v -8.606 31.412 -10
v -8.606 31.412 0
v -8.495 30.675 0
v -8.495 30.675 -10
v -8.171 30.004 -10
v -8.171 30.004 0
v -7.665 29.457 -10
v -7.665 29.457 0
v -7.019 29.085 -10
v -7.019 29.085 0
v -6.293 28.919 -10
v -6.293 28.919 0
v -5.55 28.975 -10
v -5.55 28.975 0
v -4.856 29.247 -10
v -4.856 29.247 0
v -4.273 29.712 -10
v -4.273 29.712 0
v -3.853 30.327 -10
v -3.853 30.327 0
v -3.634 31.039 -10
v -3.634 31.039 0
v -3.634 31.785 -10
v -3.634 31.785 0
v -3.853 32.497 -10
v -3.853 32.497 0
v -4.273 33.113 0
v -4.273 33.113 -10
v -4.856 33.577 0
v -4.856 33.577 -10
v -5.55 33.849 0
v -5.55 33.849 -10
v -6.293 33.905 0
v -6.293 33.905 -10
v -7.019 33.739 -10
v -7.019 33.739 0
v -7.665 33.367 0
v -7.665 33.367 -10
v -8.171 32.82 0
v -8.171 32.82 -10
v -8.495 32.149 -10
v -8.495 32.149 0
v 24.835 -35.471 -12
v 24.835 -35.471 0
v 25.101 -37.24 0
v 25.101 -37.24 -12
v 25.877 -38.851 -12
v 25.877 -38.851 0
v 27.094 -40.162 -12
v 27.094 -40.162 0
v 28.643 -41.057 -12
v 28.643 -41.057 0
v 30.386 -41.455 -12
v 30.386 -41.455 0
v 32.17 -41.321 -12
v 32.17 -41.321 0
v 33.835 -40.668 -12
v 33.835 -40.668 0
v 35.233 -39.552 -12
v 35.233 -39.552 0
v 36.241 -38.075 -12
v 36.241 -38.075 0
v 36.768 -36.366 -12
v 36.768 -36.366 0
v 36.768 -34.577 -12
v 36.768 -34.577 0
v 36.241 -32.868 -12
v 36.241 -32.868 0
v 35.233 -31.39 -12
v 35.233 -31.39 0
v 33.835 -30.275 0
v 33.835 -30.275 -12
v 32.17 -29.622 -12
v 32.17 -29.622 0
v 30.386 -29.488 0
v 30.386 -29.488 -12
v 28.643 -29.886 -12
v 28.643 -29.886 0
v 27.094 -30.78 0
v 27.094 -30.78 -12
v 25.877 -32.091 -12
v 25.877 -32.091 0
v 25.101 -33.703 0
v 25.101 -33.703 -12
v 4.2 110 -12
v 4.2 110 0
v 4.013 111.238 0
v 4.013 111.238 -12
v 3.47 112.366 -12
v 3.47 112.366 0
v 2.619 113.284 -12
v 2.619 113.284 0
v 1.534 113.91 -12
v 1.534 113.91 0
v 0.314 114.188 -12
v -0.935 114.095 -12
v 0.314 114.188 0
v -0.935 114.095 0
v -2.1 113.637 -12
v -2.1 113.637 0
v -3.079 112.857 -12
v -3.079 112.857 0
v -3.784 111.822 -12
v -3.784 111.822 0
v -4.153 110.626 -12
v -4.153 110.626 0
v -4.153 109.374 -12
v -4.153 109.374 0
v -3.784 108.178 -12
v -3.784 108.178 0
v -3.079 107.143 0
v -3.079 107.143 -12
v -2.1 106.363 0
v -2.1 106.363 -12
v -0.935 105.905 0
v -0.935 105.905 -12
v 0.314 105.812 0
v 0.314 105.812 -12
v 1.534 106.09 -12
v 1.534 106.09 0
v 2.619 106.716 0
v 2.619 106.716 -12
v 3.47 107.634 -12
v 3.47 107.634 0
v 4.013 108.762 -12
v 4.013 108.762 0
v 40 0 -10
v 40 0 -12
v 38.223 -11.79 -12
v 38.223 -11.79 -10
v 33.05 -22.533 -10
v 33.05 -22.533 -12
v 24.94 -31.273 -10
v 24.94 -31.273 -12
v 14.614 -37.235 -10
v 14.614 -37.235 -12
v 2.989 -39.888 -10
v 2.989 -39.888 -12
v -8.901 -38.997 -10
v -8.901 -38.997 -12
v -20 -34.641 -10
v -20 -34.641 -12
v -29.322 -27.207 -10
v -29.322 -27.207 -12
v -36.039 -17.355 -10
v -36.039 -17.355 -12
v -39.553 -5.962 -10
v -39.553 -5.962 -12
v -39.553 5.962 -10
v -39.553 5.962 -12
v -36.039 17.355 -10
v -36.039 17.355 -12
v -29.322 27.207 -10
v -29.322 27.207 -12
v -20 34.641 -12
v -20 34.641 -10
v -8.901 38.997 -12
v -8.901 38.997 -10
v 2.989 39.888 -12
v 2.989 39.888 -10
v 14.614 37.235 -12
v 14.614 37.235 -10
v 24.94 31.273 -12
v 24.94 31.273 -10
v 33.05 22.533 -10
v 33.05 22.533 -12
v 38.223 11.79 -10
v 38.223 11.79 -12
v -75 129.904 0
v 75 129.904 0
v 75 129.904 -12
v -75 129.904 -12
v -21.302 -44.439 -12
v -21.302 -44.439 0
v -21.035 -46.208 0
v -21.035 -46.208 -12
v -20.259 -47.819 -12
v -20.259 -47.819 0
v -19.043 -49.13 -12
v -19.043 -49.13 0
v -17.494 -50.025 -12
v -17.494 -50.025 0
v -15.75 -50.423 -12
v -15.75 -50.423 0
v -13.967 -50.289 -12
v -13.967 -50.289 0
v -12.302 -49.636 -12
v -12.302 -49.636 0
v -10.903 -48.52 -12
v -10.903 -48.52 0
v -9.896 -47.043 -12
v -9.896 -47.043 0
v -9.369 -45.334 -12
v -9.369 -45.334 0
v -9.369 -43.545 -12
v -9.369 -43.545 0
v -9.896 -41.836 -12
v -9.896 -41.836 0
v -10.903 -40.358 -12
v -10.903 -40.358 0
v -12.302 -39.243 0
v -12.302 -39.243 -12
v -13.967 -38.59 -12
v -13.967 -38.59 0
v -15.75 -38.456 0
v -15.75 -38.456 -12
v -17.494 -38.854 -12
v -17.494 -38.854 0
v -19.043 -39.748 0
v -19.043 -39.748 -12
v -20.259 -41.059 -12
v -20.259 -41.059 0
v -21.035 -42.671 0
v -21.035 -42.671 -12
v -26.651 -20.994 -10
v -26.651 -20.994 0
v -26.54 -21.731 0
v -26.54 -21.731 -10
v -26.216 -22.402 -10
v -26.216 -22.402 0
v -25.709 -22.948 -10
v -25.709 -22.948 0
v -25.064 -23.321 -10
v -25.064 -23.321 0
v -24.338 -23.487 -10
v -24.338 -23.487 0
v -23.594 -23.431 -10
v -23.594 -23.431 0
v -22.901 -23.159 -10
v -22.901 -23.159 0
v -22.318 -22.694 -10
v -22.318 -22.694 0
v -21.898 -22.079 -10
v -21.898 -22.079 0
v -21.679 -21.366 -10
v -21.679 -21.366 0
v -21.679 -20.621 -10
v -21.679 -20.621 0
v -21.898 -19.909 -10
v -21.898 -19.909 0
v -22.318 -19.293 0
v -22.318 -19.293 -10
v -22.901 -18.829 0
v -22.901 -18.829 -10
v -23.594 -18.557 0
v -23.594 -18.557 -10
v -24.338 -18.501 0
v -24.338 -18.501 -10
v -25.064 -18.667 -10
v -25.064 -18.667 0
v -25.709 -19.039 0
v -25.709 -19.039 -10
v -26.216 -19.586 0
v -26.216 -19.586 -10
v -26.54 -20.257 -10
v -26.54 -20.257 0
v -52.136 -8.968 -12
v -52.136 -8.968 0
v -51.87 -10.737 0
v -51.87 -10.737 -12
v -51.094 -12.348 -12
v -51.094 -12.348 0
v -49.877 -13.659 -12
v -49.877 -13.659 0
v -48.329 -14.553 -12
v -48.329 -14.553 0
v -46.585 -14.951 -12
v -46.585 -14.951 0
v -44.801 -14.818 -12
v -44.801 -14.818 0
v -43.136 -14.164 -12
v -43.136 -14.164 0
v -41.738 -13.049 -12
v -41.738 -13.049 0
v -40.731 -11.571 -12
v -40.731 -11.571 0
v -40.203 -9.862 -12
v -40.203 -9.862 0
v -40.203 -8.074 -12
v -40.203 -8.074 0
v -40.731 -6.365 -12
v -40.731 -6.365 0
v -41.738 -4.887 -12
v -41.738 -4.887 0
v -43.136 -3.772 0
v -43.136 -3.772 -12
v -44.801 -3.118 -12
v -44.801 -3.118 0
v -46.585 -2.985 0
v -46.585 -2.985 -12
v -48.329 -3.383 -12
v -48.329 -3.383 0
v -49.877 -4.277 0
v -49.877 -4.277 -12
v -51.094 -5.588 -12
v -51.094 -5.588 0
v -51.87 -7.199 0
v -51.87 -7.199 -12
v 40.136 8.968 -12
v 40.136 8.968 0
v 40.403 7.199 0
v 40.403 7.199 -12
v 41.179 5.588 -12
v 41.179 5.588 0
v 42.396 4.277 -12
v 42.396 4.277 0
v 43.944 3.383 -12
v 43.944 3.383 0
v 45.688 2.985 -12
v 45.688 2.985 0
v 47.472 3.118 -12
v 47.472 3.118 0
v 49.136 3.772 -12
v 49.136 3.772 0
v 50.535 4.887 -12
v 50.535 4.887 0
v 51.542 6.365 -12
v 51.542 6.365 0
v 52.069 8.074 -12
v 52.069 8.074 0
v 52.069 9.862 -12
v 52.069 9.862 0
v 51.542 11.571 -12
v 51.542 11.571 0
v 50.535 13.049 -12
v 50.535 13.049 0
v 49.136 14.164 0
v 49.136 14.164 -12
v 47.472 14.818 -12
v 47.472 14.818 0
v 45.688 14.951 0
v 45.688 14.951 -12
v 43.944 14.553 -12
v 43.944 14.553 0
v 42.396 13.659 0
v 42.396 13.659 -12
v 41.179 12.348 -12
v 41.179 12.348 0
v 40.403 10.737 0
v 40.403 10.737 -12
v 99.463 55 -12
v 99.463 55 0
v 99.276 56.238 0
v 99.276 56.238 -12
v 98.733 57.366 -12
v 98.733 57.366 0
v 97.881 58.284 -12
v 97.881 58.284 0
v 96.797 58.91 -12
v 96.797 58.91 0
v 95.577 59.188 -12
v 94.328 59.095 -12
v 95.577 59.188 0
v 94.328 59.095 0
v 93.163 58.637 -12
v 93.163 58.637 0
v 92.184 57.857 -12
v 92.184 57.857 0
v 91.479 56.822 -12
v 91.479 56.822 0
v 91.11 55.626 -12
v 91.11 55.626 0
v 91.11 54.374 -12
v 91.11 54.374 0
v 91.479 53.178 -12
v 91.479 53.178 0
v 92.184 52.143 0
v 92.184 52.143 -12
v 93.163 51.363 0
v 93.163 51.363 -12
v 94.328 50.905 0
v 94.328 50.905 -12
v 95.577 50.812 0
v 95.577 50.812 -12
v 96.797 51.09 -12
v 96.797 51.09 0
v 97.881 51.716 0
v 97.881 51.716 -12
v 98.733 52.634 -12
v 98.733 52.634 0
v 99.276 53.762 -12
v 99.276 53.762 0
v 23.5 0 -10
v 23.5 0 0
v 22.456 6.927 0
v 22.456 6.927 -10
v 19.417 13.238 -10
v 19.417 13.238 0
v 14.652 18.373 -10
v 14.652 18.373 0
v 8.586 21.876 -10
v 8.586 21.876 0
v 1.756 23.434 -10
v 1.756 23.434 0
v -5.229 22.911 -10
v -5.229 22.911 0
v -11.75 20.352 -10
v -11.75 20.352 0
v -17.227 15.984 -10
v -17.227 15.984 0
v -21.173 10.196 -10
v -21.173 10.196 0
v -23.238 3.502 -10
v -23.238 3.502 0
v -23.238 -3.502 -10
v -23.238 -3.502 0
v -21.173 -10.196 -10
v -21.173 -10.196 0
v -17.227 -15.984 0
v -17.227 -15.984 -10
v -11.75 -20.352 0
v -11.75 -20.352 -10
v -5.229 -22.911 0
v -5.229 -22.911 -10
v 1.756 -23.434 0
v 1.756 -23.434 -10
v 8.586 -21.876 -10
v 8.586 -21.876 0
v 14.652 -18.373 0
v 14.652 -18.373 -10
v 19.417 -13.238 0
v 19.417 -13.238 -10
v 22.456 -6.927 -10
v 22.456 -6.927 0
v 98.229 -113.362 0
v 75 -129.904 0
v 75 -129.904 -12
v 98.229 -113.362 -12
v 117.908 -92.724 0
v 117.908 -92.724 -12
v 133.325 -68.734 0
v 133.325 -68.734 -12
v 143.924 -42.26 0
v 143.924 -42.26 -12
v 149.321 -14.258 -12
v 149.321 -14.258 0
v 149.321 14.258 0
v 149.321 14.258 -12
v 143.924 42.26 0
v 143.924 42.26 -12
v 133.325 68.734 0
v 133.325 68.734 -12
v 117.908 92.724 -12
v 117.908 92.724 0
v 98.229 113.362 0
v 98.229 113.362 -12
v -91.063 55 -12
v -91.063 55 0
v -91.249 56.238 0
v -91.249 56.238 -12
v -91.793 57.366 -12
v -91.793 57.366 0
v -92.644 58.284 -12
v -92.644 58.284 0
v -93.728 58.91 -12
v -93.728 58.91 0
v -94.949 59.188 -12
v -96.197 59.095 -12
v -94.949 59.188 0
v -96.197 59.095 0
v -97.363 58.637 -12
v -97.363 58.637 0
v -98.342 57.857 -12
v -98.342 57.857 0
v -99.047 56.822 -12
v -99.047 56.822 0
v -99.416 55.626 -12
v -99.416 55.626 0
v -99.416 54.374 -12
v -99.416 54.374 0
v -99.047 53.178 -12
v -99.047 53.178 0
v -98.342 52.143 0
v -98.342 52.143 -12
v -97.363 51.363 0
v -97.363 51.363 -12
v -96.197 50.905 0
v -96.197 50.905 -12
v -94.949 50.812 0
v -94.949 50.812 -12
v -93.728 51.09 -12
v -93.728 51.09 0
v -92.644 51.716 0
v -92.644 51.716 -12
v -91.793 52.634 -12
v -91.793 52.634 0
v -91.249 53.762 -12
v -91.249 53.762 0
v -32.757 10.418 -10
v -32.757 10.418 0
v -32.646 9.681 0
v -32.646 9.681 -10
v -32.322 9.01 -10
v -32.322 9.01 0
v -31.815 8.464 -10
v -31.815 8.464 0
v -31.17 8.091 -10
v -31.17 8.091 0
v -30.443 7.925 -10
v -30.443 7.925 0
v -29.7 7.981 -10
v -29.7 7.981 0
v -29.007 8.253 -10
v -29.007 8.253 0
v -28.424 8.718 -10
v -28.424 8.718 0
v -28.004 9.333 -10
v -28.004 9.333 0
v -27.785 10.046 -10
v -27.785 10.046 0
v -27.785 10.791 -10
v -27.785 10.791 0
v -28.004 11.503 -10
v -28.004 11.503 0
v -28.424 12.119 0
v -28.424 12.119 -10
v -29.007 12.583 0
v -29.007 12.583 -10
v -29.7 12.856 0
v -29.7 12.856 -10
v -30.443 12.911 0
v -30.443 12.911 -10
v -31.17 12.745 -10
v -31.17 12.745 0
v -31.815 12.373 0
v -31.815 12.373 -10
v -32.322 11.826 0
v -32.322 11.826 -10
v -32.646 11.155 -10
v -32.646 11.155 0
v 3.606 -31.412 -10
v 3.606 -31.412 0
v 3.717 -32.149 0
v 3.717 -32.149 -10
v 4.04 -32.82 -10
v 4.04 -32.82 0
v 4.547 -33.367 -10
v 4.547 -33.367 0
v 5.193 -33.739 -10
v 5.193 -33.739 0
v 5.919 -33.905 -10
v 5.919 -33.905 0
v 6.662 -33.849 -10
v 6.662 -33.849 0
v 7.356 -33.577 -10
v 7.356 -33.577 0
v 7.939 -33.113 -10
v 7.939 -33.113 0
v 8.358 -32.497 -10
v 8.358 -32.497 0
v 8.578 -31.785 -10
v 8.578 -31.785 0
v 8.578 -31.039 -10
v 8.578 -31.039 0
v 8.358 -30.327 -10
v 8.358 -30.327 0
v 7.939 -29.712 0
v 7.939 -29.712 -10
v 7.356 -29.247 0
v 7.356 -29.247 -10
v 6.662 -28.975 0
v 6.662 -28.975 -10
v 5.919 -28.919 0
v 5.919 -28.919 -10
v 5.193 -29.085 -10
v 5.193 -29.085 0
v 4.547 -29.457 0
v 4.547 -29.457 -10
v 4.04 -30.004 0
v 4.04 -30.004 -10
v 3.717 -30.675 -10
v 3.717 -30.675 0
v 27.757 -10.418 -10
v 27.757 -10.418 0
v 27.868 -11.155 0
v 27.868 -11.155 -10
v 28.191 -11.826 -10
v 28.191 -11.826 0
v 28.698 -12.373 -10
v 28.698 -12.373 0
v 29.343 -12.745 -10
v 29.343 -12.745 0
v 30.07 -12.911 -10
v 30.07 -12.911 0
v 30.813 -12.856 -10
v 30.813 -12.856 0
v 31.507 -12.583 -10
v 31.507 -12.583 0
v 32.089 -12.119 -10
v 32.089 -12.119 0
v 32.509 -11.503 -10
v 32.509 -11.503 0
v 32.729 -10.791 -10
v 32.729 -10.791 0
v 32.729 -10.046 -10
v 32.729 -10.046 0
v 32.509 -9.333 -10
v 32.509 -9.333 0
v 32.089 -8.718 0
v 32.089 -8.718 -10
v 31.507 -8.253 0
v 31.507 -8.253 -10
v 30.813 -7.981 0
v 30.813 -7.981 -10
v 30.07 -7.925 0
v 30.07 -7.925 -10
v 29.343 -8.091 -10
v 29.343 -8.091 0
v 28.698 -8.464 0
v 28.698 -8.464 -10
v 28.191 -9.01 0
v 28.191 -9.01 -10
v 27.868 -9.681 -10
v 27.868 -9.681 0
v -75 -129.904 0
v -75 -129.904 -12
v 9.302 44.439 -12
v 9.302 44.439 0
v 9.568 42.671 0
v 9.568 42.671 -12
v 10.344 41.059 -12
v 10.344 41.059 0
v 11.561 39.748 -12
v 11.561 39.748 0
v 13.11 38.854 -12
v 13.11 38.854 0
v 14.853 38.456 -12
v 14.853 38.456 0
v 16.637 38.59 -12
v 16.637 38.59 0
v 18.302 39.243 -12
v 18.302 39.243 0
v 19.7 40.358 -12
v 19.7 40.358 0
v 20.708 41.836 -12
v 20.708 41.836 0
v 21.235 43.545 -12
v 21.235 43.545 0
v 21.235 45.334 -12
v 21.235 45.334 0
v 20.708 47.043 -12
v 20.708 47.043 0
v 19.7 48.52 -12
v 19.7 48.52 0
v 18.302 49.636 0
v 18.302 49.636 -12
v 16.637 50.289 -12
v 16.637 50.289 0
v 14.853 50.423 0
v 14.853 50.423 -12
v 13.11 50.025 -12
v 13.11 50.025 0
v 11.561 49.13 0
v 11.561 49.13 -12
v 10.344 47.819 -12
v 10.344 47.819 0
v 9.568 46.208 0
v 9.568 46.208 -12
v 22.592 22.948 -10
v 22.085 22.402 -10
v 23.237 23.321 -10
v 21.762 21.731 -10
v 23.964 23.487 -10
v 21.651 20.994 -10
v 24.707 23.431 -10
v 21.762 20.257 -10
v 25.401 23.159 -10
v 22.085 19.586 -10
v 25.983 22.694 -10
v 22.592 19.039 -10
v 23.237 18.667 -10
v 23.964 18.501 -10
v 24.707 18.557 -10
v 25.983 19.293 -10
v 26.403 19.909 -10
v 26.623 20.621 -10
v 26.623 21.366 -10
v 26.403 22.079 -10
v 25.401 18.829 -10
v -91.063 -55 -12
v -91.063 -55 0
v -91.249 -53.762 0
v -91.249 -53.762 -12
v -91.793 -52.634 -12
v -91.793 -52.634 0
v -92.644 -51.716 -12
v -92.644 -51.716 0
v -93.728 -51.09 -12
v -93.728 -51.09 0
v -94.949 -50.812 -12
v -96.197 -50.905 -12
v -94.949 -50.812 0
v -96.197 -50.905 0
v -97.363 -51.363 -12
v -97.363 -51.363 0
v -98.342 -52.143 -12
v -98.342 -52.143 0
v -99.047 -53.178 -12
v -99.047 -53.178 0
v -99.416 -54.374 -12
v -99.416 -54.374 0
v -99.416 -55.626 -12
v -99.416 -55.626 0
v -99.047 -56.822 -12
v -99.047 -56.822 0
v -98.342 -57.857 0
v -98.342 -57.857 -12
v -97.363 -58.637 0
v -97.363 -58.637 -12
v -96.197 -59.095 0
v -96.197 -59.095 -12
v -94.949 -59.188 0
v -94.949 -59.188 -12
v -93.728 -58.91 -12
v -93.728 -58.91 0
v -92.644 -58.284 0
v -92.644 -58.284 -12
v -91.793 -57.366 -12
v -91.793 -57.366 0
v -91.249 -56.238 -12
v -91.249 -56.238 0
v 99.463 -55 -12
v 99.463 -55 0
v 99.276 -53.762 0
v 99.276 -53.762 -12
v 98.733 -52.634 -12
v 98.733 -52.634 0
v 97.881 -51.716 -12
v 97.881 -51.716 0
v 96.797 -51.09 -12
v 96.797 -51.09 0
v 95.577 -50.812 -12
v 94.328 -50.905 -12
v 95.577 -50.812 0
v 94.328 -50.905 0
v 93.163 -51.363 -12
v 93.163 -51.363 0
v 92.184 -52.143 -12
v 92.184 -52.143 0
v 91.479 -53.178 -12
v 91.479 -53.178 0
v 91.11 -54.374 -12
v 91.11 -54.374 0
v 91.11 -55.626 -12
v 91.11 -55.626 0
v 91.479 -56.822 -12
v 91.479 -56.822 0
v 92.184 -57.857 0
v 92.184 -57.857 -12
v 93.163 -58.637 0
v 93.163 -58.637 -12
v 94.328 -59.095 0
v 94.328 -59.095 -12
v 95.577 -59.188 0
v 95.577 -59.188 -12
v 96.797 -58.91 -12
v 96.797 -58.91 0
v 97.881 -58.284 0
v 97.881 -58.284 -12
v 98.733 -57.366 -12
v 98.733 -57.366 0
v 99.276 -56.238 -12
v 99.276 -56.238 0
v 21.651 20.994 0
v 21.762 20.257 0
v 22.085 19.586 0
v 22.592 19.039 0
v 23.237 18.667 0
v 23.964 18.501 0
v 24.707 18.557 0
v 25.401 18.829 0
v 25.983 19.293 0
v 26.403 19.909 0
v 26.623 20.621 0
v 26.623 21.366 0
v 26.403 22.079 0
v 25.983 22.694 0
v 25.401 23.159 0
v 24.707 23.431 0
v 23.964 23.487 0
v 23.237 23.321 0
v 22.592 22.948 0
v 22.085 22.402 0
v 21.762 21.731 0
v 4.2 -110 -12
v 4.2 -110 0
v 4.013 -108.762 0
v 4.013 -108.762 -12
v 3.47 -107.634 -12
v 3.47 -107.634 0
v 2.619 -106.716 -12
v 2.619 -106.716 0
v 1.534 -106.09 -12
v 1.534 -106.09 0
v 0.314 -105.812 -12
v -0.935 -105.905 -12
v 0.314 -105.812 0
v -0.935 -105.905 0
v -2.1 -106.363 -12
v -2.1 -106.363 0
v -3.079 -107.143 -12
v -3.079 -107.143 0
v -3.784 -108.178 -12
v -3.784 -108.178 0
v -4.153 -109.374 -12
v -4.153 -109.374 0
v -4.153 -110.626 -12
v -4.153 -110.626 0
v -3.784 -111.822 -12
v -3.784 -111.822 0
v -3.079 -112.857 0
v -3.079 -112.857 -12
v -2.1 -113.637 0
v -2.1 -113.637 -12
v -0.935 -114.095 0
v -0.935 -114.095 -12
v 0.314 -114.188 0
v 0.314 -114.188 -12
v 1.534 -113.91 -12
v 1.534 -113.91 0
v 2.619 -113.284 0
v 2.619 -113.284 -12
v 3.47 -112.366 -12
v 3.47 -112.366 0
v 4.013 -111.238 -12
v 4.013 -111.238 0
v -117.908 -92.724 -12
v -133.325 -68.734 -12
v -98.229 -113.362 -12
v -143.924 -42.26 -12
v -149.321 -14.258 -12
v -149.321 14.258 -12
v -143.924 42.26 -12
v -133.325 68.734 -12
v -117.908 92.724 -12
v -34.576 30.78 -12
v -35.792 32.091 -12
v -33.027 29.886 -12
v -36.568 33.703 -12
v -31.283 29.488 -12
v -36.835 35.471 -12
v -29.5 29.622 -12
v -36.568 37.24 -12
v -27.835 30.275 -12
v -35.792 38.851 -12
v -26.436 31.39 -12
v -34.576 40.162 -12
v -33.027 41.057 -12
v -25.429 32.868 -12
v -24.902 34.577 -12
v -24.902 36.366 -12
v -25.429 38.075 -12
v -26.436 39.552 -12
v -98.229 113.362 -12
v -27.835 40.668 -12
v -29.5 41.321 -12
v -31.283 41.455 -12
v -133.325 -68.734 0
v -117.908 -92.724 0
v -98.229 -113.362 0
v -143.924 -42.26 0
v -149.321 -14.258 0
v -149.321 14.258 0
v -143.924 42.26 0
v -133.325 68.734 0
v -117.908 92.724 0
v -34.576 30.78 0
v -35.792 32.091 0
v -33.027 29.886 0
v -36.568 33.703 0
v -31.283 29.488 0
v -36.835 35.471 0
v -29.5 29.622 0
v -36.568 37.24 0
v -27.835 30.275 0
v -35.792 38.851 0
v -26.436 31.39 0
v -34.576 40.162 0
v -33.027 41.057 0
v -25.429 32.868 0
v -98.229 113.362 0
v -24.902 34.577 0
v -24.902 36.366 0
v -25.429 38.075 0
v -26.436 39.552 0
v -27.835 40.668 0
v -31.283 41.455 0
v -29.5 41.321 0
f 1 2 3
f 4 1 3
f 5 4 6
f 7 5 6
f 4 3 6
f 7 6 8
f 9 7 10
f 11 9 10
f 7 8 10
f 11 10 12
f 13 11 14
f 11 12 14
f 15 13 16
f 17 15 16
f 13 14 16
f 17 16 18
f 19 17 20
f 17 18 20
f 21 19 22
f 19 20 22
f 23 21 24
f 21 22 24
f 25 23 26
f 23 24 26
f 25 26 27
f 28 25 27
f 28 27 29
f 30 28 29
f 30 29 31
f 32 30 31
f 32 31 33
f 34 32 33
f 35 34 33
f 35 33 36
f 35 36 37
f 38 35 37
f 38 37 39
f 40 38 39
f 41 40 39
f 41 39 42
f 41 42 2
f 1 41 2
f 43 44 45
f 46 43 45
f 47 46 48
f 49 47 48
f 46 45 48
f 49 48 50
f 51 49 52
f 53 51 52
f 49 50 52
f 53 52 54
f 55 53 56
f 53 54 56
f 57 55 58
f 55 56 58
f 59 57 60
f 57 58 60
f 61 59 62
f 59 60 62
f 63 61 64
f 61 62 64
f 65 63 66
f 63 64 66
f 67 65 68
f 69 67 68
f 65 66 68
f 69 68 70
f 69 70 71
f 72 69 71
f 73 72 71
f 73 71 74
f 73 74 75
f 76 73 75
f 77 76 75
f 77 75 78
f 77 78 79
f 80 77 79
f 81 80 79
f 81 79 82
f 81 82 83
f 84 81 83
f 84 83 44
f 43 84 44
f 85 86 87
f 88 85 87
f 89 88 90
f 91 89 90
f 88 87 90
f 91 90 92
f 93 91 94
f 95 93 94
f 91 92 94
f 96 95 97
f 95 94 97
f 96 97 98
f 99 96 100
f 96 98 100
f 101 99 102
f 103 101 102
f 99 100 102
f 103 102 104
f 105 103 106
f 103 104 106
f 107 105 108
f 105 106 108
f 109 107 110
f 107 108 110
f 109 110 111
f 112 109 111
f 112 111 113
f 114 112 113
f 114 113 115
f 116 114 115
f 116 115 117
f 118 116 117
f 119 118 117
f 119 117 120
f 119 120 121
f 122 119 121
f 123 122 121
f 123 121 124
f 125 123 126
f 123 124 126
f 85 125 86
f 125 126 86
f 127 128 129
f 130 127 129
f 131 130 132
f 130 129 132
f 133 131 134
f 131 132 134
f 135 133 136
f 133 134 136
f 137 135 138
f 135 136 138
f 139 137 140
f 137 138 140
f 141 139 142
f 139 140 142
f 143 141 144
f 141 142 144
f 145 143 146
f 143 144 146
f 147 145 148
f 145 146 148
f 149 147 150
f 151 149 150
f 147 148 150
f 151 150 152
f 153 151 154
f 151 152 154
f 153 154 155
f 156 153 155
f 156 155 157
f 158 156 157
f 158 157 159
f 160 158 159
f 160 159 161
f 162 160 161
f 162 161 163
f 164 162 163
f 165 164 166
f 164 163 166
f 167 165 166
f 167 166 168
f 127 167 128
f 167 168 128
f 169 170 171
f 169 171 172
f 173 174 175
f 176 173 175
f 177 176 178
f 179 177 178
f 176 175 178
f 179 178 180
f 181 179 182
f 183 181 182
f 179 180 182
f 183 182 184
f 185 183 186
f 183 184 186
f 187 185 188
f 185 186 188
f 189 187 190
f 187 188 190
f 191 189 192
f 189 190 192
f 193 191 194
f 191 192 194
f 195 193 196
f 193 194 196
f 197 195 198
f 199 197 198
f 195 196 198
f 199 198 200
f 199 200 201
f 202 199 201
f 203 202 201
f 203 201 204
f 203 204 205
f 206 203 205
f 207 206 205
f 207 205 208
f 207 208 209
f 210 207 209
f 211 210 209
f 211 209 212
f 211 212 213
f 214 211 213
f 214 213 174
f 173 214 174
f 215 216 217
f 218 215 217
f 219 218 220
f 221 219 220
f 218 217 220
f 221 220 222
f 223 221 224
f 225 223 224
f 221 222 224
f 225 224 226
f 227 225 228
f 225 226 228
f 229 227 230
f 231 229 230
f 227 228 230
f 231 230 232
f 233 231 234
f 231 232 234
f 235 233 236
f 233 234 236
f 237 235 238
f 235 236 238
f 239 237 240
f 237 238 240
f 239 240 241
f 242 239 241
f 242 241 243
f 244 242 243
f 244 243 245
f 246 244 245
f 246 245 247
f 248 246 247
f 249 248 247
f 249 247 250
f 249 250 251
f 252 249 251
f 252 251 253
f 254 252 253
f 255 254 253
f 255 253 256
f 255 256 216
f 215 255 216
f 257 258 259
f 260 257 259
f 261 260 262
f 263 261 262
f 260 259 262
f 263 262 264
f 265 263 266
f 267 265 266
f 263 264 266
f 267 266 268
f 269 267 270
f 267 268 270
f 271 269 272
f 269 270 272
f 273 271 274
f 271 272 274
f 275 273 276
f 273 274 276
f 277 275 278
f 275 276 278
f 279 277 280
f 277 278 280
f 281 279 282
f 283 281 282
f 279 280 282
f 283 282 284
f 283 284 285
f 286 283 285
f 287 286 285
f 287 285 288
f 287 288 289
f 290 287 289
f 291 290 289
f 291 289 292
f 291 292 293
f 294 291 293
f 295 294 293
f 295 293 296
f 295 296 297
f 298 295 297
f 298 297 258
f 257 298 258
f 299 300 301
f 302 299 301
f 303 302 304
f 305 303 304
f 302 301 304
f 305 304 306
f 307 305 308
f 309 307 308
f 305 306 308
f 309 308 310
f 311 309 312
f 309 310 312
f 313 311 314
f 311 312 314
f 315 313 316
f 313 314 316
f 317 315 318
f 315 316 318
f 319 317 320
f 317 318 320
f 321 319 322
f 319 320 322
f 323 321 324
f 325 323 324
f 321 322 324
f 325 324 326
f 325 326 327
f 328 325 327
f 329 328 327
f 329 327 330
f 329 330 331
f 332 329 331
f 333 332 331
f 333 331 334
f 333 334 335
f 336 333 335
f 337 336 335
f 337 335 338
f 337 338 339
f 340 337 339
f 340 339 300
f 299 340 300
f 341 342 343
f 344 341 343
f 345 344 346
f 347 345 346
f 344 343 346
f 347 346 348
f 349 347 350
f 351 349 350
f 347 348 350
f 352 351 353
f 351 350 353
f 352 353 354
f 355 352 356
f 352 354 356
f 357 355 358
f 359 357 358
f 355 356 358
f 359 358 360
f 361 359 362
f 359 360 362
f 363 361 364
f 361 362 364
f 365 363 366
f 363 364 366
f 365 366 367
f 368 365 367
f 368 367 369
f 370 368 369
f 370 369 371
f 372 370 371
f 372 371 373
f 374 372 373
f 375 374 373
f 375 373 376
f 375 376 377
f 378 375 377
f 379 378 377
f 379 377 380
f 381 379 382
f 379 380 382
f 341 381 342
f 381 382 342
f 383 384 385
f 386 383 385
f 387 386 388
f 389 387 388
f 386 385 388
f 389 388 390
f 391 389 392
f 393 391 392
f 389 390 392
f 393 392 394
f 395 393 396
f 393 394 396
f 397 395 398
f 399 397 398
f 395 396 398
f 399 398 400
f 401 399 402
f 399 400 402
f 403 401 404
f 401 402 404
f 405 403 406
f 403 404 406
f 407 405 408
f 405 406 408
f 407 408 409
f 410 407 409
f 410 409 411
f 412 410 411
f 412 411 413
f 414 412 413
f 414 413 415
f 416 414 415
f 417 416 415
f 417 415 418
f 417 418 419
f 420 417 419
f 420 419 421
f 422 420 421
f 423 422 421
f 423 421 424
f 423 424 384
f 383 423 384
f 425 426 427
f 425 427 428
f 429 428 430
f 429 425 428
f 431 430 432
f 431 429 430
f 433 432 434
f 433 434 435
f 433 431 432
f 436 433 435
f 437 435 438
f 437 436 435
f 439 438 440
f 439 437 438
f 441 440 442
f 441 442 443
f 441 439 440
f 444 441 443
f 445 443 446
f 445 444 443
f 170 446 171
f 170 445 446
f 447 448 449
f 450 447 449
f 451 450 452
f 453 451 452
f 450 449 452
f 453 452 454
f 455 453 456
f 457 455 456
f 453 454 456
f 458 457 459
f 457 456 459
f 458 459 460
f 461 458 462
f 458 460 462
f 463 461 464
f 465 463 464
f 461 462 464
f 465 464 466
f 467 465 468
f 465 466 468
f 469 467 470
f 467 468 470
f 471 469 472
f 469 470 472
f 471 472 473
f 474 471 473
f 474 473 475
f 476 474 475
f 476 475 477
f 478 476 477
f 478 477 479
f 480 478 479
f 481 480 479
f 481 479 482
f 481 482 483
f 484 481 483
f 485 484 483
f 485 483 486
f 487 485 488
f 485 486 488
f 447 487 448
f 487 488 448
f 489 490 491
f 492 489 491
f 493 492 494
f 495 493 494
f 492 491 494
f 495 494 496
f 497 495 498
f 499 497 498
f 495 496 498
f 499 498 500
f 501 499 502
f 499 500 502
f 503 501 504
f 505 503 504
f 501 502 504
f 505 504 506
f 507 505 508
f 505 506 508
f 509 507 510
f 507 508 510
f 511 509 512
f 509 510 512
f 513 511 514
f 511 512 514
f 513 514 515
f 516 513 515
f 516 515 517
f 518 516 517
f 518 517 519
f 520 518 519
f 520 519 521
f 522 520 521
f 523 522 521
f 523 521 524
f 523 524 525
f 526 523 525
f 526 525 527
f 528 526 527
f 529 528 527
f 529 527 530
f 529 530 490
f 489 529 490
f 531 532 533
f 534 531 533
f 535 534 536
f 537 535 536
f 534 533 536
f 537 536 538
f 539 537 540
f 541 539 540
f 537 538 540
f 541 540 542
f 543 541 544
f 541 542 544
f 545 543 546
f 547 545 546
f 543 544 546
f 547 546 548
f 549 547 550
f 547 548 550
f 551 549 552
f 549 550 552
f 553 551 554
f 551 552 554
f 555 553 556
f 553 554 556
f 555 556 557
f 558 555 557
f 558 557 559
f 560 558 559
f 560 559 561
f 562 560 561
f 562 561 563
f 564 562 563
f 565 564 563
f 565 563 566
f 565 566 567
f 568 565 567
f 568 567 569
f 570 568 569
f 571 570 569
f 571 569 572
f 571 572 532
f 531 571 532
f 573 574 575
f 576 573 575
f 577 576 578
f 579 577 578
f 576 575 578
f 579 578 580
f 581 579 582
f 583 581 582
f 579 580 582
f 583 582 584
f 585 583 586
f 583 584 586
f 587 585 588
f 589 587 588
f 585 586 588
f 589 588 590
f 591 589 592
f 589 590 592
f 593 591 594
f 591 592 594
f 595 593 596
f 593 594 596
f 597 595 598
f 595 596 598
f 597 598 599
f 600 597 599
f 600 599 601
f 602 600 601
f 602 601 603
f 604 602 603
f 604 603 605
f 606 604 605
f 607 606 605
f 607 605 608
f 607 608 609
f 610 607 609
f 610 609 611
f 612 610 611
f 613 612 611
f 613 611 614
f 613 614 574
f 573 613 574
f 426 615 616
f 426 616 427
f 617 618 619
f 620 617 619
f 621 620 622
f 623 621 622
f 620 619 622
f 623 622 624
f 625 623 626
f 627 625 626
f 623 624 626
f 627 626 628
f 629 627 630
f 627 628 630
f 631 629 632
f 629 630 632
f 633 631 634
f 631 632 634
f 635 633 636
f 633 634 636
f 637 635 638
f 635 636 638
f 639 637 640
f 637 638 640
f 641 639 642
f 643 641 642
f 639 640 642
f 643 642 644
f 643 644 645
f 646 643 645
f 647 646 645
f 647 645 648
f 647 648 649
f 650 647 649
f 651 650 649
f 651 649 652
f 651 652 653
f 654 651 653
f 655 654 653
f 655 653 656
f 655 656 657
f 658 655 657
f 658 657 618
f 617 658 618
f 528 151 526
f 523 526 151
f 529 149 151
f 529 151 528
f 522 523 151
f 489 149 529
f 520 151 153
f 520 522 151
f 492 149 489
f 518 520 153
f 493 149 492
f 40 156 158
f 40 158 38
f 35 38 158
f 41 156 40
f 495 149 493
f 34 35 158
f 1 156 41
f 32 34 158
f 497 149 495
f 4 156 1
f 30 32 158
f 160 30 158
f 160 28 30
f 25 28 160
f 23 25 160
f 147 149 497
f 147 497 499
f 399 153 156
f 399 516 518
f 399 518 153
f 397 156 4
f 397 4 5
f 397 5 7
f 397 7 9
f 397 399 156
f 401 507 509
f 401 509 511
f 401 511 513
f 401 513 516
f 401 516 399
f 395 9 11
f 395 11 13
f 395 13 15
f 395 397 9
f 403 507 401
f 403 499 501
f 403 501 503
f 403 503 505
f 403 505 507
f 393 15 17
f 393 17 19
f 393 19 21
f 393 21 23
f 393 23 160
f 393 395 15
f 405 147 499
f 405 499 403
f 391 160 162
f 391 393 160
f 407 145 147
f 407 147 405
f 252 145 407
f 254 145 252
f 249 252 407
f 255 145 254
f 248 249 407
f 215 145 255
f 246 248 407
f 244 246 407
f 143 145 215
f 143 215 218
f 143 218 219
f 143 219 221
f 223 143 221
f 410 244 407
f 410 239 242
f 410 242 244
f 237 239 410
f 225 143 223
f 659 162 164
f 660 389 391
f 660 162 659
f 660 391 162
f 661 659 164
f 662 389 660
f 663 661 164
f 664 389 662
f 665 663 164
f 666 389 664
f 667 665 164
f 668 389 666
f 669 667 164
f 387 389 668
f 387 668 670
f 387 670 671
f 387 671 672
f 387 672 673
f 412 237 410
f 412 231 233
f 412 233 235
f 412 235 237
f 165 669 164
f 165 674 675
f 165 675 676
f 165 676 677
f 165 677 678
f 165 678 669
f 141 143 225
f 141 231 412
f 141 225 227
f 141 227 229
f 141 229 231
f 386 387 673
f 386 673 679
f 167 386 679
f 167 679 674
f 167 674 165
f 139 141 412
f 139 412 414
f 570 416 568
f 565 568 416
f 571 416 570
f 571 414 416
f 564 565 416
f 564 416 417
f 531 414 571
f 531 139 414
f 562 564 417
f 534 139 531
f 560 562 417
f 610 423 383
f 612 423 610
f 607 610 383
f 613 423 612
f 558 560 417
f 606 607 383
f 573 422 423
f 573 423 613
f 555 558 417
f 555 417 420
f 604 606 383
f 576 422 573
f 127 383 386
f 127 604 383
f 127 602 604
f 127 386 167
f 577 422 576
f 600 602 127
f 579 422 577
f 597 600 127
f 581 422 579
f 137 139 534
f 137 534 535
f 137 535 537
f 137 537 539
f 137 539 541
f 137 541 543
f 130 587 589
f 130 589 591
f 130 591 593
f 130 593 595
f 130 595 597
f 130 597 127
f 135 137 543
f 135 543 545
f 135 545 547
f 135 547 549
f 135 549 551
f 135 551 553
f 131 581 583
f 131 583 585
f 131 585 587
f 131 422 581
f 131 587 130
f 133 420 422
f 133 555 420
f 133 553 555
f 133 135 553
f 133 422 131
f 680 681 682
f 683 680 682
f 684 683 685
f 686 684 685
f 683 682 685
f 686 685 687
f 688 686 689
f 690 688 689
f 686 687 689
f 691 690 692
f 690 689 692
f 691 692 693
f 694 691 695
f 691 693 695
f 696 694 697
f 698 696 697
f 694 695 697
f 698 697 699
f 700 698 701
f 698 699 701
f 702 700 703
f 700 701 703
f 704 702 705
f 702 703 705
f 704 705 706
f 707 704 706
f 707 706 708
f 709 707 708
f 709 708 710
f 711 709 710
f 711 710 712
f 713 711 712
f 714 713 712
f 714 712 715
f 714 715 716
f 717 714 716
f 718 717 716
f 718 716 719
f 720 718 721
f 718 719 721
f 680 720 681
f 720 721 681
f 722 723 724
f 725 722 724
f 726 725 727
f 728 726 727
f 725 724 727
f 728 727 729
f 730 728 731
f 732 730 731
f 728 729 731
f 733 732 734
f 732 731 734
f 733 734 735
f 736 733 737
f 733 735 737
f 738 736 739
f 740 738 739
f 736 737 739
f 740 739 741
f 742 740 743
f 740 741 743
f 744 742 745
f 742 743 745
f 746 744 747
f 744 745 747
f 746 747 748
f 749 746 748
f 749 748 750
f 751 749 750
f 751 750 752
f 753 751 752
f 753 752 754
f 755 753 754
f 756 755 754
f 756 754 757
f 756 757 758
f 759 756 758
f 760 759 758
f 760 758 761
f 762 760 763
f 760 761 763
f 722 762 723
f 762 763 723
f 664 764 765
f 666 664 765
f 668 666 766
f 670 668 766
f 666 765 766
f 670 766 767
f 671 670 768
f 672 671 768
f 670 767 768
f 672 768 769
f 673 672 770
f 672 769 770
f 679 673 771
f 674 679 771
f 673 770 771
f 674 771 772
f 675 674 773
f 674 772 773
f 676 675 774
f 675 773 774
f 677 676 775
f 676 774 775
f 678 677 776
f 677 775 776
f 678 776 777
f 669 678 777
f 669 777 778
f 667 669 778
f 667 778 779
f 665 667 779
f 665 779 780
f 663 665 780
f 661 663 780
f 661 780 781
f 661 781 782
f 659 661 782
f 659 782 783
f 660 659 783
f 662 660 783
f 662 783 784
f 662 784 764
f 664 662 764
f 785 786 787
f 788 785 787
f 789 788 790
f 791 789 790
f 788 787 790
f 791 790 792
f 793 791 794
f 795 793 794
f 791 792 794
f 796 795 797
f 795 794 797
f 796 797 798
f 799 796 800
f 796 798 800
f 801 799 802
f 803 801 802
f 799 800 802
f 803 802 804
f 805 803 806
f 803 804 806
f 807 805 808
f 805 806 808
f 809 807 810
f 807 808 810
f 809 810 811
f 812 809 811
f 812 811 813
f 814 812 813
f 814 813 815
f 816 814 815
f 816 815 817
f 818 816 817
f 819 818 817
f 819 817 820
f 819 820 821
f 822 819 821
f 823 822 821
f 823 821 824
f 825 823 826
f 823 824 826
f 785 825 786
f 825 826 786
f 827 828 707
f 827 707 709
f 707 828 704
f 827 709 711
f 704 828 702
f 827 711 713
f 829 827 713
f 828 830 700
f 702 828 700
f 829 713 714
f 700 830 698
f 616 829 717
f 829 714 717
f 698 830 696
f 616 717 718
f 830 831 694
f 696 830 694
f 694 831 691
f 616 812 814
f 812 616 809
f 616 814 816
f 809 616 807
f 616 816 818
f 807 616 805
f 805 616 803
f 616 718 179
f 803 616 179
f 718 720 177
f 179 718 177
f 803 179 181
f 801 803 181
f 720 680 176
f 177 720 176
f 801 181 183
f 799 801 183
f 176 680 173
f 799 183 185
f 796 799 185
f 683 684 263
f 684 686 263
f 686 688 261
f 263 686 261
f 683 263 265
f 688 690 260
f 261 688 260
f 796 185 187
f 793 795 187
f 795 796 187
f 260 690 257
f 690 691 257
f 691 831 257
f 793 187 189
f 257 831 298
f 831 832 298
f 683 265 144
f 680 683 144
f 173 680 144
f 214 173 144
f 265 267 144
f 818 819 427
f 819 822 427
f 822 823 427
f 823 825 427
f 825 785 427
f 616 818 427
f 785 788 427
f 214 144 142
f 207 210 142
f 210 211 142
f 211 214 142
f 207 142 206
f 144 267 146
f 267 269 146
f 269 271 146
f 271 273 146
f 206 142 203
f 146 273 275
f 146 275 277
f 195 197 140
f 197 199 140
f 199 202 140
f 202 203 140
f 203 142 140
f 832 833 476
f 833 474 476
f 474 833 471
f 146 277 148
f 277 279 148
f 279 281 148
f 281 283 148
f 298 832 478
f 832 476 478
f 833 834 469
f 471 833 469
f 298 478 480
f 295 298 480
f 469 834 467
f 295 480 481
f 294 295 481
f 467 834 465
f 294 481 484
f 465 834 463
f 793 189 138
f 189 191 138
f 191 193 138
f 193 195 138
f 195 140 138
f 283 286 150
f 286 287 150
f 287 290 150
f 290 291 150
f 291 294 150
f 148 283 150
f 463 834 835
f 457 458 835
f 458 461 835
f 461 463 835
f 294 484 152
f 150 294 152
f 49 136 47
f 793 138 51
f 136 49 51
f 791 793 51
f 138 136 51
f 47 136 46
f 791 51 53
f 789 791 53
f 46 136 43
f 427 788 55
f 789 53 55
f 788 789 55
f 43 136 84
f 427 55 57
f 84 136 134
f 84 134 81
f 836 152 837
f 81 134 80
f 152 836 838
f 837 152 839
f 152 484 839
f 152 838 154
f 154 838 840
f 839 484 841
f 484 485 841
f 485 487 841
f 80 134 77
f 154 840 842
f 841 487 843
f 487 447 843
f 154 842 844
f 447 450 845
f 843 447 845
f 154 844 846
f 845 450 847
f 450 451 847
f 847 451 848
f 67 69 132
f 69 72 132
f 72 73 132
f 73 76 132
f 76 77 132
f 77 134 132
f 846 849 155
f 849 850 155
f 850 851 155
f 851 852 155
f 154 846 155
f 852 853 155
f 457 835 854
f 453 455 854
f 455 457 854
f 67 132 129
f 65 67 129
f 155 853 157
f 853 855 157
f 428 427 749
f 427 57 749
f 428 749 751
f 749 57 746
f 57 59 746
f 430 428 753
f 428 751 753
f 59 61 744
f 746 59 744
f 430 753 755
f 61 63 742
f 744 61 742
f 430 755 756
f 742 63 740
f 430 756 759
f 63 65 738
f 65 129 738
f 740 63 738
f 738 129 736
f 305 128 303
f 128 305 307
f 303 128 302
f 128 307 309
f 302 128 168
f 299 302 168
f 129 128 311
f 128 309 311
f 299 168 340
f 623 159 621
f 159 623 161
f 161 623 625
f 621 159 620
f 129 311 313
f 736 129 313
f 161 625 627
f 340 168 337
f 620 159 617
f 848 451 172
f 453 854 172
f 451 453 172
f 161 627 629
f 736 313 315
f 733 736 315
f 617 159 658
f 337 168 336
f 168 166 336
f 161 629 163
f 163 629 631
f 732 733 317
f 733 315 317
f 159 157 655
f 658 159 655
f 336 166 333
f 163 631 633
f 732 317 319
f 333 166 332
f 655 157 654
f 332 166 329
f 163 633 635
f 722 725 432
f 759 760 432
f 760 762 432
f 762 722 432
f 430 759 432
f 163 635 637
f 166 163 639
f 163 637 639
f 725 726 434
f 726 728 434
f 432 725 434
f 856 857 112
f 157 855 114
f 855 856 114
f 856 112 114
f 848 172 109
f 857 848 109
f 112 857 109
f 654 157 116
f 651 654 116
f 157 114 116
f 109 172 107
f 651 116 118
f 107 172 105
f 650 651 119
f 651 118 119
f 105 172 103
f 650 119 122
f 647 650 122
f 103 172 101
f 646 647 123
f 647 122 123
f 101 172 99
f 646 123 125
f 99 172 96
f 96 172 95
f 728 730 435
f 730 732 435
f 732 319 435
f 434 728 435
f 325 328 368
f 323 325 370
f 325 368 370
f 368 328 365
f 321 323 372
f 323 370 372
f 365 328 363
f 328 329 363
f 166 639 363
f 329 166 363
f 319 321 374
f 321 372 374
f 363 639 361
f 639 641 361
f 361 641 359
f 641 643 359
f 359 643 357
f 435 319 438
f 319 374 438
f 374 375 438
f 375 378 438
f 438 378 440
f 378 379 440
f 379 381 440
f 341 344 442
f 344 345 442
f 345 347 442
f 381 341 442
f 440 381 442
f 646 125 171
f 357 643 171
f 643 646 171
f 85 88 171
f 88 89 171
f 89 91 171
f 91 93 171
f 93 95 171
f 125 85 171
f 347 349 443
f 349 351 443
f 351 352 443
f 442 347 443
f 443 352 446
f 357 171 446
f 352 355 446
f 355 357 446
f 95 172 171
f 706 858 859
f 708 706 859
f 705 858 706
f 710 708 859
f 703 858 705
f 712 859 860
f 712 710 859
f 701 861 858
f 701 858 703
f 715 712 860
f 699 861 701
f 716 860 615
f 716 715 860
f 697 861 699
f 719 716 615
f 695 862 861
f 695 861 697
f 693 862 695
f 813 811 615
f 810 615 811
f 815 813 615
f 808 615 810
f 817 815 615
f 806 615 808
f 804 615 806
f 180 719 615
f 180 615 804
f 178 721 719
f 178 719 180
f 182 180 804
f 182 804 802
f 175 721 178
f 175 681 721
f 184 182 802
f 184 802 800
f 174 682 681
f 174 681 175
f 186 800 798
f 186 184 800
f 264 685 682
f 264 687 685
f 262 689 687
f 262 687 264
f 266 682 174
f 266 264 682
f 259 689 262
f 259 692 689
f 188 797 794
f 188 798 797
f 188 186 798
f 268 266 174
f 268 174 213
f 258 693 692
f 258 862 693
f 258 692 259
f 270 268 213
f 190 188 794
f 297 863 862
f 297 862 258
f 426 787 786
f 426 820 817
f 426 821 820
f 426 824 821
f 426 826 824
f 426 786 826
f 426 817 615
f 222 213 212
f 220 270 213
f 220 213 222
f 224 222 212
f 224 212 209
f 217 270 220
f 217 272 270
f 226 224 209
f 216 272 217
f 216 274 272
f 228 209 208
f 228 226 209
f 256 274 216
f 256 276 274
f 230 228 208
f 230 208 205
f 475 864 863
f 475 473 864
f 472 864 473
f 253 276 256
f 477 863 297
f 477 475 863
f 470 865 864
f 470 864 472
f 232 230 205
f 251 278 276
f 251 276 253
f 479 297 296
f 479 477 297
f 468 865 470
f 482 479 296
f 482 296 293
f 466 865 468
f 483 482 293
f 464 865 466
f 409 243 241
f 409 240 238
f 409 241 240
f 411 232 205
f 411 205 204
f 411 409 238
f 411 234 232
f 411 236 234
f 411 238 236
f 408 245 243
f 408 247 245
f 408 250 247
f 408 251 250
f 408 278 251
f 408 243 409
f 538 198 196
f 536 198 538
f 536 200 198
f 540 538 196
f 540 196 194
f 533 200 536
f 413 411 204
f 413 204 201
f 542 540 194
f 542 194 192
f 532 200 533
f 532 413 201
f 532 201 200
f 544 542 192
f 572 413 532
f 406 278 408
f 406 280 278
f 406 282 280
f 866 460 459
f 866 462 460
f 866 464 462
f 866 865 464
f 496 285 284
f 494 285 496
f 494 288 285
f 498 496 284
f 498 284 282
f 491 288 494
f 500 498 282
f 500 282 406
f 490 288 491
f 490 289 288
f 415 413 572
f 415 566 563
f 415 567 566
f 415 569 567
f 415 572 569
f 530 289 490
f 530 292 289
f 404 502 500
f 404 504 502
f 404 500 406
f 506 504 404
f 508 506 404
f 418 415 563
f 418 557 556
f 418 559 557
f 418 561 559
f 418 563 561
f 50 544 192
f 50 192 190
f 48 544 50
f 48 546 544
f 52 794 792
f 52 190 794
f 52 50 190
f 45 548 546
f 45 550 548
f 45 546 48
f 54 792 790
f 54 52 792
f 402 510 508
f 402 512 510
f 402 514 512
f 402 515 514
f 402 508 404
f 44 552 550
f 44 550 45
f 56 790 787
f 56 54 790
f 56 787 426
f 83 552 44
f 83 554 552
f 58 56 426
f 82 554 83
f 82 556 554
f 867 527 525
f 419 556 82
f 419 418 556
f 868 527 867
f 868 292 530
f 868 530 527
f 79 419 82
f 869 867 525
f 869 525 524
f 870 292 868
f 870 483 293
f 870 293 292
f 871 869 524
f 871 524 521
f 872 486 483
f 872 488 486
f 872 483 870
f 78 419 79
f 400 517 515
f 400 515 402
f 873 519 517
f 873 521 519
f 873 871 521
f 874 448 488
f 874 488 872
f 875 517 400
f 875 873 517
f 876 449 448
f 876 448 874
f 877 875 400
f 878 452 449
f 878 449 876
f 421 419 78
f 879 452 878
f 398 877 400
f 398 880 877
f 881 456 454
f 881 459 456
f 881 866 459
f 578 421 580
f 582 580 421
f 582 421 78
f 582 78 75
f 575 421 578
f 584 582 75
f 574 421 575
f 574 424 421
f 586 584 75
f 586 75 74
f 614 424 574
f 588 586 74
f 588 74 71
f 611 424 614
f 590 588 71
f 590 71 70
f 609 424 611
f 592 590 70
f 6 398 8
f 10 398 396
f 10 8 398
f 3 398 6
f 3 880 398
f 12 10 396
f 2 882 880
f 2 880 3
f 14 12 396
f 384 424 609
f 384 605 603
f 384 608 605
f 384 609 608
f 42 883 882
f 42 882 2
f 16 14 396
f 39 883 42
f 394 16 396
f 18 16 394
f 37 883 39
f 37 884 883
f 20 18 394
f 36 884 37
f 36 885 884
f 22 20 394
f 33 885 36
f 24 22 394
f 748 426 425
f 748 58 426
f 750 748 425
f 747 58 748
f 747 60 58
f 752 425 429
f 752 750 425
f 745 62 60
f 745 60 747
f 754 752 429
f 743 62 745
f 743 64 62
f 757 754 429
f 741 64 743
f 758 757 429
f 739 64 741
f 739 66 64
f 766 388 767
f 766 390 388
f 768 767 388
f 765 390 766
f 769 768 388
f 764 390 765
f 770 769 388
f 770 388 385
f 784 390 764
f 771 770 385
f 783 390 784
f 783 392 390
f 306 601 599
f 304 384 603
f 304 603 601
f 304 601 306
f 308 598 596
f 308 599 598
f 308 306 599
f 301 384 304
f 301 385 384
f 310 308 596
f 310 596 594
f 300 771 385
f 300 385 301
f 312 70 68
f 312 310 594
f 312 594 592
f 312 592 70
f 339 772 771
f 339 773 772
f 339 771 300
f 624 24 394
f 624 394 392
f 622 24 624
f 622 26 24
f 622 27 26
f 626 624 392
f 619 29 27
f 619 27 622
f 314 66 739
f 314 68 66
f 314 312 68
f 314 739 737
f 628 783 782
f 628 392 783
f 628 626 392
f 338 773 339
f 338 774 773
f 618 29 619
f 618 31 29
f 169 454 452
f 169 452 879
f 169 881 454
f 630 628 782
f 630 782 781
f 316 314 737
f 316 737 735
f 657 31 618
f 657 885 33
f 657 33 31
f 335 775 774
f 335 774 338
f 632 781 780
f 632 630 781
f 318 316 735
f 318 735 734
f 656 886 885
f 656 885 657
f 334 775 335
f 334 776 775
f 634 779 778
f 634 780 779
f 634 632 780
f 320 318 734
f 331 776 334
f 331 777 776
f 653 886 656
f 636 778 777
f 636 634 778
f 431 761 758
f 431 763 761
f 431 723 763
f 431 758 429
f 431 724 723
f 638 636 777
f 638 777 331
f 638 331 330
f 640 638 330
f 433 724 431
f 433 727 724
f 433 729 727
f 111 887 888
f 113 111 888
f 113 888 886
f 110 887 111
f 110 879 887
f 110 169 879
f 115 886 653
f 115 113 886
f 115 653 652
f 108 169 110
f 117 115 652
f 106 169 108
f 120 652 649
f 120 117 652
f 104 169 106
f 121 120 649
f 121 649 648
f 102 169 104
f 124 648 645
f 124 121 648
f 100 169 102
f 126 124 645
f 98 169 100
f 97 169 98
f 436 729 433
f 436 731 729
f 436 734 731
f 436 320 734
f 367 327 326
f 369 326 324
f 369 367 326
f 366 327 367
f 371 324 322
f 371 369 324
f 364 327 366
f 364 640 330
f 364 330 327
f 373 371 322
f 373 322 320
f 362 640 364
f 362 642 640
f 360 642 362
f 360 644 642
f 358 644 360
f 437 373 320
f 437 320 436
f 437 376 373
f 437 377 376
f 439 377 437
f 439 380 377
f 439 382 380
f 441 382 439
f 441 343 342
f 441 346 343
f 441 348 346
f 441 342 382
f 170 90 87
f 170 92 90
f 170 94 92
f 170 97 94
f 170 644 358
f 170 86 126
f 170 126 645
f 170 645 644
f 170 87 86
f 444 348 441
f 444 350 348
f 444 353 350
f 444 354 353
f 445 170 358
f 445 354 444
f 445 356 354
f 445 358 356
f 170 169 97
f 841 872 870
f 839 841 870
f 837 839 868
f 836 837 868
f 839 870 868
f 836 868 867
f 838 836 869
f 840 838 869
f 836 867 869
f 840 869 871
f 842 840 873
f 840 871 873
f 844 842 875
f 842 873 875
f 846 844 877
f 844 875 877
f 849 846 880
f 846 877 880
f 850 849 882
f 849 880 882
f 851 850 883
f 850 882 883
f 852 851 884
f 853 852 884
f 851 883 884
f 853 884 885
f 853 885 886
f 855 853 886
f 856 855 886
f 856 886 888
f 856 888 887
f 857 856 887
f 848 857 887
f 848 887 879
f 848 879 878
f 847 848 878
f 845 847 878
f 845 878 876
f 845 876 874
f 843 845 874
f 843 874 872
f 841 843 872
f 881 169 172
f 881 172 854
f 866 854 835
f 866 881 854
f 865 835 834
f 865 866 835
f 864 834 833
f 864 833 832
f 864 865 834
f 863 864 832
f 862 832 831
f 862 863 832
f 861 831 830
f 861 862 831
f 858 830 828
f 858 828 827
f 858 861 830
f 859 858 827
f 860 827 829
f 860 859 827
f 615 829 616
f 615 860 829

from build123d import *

# Parameters (mm, degrees)
F0_R          = 4.2
F0_R_2        = 23.5
F1_DEPTH      = 12
F3_R          = 40
F4_DEPTH      = 2
F4_DEPTH_BACK = 10
F6_D          = 5
F7_D          = 12


with BuildPart() as f1:
    # F0 (on Top) → F1 (new body)
    with BuildSketch(Plane.XY):
        with BuildLine():
            Line((75, 129.9038105677), (-75, 129.9038105677))
            ThreePointArc((-75, 129.9038105677), (-150, 0), (-75, -129.9038105677))
            Line((-75, -129.9038105677), (75, -129.9038105677))
            ThreePointArc((75, -129.9038105677), (150, 0), (75, 129.9038105677))
        make_face()
        with Locations((0, -110)):
            Circle(F0_R, mode=Mode.SUBTRACT)
        with Locations((-95.2627944163, -55)):
            Circle(F0_R, mode=Mode.SUBTRACT)
        with Locations((95.2627944163, -55)):
            Circle(F0_R, mode=Mode.SUBTRACT)
        with Locations((-95.2627944163, 55)):
            Circle(F0_R, mode=Mode.SUBTRACT)
        Circle(F0_R_2, mode=Mode.SUBTRACT)
        with Locations((0, 110)):
            Circle(F0_R, mode=Mode.SUBTRACT)
        with Locations((95.2627944163, 55)):
            Circle(F0_R, mode=Mode.SUBTRACT)
    extrude(amount=-F1_DEPTH)

    # F3 (on offset) → F4 (cut, two sides)
    with BuildSketch(Plane(origin=(0, 0, -12), x_dir=(1, 0, 0), z_dir=(0, 0, -1))) as f4_sk:
        Circle(F3_R)
    extrude(amount=-F4_DEPTH, mode=Mode.SUBTRACT)
    extrude(f4_sk.sketch, amount=F4_DEPTH_BACK, mode=Mode.SUBTRACT)

    # F6 (through all)
    with Locations(Plane(origin=(0, 0, -12), x_dir=(1, 0, 0), z_dir=(0, 0, -1))):
        with Locations((6.105887852, 31.4120698703), (-24.1507065671, 20.9938889277), (-30.2565944192, -10.4181809426), (-6.105887852, -31.4120698703), (24.1507065671, -20.9938889277), (30.2565944192, 10.4181809426)):
            Hole(F6_D / 2)

    # F7 (through all)
    with Locations(Plane(origin=(0, 0, -12), x_dir=(1, 0, 0), z_dir=(0, 0, -1))):
        with Locations((-30.8347743626, -35.4713502705), (15.3017032595, -44.4393730532), (46.136477622, -8.9680227827), (30.8347743626, 35.4713502705), (-15.3017032595, 44.4393730532), (-46.136477622, 8.9680227827)):
            Hole(F7_D / 2)


solid = f1.part
